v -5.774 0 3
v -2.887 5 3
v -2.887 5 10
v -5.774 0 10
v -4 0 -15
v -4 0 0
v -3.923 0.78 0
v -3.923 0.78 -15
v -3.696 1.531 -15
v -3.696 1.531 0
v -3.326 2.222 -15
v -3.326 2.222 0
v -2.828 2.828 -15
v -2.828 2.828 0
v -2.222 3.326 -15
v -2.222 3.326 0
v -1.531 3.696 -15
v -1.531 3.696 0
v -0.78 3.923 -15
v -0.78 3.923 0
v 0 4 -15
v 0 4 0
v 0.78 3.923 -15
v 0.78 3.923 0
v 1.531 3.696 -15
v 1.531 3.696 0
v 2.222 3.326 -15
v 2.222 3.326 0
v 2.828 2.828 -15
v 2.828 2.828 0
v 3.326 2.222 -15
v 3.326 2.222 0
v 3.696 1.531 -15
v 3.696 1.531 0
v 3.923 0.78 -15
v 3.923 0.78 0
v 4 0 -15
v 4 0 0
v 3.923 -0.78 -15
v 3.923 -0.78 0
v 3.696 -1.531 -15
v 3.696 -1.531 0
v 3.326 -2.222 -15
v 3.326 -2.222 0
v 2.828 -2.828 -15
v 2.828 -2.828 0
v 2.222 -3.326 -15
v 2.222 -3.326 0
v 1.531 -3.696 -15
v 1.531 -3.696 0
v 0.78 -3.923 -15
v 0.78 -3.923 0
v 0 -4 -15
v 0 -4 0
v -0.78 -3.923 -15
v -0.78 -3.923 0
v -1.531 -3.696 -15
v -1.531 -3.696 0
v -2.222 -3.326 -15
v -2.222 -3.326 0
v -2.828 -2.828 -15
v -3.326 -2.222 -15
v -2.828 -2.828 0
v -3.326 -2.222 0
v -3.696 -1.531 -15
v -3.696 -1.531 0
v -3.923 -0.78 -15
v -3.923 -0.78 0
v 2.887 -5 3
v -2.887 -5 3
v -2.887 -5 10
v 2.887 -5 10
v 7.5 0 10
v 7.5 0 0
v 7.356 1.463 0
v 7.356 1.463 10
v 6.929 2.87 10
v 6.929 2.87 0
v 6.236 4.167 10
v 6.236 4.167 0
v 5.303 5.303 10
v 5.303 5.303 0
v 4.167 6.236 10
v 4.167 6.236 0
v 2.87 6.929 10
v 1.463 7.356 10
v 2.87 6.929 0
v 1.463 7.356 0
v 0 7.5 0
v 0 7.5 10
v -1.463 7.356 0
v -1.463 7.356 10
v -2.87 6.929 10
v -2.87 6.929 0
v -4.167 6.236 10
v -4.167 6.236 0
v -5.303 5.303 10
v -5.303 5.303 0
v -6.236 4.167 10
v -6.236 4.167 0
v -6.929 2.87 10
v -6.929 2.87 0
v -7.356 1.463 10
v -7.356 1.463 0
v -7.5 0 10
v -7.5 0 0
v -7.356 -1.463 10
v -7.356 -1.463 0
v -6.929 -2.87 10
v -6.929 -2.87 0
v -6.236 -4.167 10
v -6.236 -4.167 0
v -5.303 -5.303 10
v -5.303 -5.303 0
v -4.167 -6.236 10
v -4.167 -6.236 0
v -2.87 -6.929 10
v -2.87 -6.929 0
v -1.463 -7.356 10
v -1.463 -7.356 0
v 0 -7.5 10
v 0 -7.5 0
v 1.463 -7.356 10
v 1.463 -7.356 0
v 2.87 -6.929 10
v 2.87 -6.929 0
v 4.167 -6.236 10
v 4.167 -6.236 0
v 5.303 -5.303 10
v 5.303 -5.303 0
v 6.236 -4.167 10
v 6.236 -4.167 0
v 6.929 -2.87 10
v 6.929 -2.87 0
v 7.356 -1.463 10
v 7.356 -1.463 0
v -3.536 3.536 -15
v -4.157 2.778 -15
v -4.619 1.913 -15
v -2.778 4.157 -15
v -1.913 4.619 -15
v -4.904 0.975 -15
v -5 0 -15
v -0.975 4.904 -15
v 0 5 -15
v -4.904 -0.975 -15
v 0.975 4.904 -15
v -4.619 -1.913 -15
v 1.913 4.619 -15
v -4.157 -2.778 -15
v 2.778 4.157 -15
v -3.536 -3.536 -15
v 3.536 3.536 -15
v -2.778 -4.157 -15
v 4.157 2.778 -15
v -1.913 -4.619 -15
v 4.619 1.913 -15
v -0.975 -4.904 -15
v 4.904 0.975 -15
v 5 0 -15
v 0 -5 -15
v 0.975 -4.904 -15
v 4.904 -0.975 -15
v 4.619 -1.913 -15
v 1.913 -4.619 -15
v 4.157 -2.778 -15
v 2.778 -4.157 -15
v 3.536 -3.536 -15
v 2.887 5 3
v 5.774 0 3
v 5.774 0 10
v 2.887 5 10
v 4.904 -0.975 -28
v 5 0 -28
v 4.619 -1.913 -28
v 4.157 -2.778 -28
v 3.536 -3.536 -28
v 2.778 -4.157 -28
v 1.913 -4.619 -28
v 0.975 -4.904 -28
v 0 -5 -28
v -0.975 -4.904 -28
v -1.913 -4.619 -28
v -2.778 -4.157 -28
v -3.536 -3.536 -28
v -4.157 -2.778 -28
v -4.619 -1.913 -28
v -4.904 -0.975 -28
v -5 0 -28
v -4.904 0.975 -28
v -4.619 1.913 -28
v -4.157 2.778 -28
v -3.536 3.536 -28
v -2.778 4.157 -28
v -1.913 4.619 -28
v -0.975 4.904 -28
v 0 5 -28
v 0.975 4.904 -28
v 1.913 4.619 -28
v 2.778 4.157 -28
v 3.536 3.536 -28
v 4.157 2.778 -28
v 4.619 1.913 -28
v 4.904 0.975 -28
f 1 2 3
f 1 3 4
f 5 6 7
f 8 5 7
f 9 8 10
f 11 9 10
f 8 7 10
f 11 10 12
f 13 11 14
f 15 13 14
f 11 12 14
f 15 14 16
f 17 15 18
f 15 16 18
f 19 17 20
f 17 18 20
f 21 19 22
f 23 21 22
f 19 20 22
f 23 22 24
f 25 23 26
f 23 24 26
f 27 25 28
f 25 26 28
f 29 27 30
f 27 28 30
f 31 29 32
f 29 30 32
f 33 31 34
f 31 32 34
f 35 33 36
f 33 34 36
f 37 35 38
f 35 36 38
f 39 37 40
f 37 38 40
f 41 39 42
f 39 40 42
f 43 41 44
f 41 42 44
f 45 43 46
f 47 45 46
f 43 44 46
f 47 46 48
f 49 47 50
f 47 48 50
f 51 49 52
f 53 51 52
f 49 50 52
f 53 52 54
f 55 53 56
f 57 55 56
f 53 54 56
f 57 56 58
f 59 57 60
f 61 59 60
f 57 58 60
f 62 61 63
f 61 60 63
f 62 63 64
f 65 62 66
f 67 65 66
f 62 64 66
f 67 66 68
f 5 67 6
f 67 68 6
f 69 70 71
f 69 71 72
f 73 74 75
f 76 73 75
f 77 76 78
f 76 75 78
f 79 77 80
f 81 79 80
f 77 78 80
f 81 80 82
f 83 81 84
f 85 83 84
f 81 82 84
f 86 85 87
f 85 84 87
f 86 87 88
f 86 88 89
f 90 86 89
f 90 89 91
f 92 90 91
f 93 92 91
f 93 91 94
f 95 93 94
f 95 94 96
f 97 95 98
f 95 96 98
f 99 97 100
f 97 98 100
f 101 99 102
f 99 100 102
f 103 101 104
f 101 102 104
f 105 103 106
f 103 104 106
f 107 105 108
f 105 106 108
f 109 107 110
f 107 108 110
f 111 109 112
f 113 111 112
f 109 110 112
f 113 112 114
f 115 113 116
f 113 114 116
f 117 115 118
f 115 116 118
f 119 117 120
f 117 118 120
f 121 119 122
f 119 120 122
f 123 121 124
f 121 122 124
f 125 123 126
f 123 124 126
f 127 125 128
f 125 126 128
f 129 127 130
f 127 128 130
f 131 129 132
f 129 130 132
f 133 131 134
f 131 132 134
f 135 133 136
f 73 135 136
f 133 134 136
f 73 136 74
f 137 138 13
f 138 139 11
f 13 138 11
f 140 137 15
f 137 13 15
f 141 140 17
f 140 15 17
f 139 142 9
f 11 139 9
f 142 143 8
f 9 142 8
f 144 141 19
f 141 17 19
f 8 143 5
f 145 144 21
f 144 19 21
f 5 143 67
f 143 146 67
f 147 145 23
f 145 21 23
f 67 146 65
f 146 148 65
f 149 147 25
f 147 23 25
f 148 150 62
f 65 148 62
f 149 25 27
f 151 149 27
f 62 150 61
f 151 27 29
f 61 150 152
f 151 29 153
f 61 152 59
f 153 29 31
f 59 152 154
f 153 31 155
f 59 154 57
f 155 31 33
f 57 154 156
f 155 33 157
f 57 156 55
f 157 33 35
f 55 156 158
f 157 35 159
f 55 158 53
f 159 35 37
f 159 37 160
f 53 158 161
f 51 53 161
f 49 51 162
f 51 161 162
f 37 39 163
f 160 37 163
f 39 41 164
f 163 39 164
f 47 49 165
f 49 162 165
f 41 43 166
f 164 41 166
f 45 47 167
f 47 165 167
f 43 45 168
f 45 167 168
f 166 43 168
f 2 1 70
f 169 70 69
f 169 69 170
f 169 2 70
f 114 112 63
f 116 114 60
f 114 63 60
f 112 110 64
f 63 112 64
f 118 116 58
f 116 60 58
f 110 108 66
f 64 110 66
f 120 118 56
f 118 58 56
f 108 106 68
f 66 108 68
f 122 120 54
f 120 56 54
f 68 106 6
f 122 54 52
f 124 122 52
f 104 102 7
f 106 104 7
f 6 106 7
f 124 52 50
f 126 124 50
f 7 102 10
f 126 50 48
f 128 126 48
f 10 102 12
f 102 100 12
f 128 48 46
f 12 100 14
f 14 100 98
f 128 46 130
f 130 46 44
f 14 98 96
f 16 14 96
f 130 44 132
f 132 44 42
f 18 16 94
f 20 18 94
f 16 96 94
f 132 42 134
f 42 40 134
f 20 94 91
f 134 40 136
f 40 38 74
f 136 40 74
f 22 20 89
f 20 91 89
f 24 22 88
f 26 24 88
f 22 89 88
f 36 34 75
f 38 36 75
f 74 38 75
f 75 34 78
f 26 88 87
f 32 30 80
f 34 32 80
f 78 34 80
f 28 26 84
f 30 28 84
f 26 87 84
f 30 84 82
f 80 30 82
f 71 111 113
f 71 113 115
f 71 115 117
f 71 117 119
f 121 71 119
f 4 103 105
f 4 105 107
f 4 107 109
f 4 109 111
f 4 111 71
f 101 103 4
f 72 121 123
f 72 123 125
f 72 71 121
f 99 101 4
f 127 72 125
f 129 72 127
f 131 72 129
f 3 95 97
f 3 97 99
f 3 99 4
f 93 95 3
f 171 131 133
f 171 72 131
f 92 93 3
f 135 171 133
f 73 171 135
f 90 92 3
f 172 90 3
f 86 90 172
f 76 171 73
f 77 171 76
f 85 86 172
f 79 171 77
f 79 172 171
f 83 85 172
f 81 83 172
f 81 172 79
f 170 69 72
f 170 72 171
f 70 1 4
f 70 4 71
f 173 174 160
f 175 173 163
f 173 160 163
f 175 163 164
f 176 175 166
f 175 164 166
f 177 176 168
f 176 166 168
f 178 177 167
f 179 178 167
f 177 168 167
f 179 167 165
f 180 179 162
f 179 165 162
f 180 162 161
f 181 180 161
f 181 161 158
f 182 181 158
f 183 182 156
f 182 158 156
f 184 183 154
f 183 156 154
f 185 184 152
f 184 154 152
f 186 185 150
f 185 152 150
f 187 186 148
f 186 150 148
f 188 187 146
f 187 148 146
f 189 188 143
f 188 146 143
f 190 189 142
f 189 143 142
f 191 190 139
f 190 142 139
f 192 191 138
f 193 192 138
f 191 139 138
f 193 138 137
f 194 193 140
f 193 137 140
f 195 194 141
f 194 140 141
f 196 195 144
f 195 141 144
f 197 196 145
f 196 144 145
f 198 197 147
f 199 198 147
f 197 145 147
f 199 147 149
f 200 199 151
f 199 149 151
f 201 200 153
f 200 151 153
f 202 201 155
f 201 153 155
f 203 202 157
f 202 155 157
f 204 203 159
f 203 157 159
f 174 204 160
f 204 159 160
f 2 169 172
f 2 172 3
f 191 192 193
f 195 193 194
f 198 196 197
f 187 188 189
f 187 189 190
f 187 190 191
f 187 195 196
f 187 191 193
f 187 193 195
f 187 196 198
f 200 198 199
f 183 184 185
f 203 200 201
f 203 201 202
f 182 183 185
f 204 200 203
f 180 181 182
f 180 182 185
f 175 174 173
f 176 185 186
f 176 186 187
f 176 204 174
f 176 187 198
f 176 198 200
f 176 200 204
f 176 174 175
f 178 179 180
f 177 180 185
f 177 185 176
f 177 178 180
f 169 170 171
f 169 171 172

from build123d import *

# Parameters (mm, degrees)
SKETCH1_R               = 7.5
BOSS_EXTRUDE1_DEPTH     = 10
SKETCH2_R               = 4
BOSS_EXTRUDE2_DEPTH     = 15
SKETCH3_R               = 5
BOSS_EXTRUDE3_DEPTH     = 13
CUT_EXTRUDE1_DEPTH      = 40.452503089
CUT_EXTRUDE1_DEPTH_BACK = 7


with BuildPart() as part:
    # Sketch1 → Boss-Extrude1 (new body)
    with BuildSketch(Plane.XY):
        Circle(SKETCH1_R)
    extrude(amount=BOSS_EXTRUDE1_DEPTH)

    # Sketch2 → Boss-Extrude2 (add)
    with BuildSketch(Plane(origin=(0, 0, 0), x_dir=(-1, 0, 0), z_dir=(0, 0, -1))):
        Circle(SKETCH2_R)
    extrude(amount=BOSS_EXTRUDE2_DEPTH)

    # Sketch3 → Boss-Extrude3 (add)
    with BuildSketch(Plane(origin=(0, 0, -15), x_dir=(-1, 0, 0), z_dir=(0, 0, -1))):
        with Locations(Location((0, 0, 0), (0, 0, 180))):
            Circle(SKETCH3_R)
    extrude(amount=BOSS_EXTRUDE3_DEPTH)

    # Sketch4 → Cut-Extrude1 (cut, two sides: drawn at the far end of the back side and taken through both)
    with BuildSketch(Plane.XY.offset(10).offset(-CUT_EXTRUDE1_DEPTH_BACK)):
        Polygon((5.773502692, 0), (2.886751346, 5), (-2.886751346, 5), (-5.773502692, 0), (-2.886751346, -5), (2.886751346, -5), align=None)
    extrude(amount=CUT_EXTRUDE1_DEPTH + CUT_EXTRUDE1_DEPTH_BACK, mode=Mode.SUBTRACT)


solid = part.part
